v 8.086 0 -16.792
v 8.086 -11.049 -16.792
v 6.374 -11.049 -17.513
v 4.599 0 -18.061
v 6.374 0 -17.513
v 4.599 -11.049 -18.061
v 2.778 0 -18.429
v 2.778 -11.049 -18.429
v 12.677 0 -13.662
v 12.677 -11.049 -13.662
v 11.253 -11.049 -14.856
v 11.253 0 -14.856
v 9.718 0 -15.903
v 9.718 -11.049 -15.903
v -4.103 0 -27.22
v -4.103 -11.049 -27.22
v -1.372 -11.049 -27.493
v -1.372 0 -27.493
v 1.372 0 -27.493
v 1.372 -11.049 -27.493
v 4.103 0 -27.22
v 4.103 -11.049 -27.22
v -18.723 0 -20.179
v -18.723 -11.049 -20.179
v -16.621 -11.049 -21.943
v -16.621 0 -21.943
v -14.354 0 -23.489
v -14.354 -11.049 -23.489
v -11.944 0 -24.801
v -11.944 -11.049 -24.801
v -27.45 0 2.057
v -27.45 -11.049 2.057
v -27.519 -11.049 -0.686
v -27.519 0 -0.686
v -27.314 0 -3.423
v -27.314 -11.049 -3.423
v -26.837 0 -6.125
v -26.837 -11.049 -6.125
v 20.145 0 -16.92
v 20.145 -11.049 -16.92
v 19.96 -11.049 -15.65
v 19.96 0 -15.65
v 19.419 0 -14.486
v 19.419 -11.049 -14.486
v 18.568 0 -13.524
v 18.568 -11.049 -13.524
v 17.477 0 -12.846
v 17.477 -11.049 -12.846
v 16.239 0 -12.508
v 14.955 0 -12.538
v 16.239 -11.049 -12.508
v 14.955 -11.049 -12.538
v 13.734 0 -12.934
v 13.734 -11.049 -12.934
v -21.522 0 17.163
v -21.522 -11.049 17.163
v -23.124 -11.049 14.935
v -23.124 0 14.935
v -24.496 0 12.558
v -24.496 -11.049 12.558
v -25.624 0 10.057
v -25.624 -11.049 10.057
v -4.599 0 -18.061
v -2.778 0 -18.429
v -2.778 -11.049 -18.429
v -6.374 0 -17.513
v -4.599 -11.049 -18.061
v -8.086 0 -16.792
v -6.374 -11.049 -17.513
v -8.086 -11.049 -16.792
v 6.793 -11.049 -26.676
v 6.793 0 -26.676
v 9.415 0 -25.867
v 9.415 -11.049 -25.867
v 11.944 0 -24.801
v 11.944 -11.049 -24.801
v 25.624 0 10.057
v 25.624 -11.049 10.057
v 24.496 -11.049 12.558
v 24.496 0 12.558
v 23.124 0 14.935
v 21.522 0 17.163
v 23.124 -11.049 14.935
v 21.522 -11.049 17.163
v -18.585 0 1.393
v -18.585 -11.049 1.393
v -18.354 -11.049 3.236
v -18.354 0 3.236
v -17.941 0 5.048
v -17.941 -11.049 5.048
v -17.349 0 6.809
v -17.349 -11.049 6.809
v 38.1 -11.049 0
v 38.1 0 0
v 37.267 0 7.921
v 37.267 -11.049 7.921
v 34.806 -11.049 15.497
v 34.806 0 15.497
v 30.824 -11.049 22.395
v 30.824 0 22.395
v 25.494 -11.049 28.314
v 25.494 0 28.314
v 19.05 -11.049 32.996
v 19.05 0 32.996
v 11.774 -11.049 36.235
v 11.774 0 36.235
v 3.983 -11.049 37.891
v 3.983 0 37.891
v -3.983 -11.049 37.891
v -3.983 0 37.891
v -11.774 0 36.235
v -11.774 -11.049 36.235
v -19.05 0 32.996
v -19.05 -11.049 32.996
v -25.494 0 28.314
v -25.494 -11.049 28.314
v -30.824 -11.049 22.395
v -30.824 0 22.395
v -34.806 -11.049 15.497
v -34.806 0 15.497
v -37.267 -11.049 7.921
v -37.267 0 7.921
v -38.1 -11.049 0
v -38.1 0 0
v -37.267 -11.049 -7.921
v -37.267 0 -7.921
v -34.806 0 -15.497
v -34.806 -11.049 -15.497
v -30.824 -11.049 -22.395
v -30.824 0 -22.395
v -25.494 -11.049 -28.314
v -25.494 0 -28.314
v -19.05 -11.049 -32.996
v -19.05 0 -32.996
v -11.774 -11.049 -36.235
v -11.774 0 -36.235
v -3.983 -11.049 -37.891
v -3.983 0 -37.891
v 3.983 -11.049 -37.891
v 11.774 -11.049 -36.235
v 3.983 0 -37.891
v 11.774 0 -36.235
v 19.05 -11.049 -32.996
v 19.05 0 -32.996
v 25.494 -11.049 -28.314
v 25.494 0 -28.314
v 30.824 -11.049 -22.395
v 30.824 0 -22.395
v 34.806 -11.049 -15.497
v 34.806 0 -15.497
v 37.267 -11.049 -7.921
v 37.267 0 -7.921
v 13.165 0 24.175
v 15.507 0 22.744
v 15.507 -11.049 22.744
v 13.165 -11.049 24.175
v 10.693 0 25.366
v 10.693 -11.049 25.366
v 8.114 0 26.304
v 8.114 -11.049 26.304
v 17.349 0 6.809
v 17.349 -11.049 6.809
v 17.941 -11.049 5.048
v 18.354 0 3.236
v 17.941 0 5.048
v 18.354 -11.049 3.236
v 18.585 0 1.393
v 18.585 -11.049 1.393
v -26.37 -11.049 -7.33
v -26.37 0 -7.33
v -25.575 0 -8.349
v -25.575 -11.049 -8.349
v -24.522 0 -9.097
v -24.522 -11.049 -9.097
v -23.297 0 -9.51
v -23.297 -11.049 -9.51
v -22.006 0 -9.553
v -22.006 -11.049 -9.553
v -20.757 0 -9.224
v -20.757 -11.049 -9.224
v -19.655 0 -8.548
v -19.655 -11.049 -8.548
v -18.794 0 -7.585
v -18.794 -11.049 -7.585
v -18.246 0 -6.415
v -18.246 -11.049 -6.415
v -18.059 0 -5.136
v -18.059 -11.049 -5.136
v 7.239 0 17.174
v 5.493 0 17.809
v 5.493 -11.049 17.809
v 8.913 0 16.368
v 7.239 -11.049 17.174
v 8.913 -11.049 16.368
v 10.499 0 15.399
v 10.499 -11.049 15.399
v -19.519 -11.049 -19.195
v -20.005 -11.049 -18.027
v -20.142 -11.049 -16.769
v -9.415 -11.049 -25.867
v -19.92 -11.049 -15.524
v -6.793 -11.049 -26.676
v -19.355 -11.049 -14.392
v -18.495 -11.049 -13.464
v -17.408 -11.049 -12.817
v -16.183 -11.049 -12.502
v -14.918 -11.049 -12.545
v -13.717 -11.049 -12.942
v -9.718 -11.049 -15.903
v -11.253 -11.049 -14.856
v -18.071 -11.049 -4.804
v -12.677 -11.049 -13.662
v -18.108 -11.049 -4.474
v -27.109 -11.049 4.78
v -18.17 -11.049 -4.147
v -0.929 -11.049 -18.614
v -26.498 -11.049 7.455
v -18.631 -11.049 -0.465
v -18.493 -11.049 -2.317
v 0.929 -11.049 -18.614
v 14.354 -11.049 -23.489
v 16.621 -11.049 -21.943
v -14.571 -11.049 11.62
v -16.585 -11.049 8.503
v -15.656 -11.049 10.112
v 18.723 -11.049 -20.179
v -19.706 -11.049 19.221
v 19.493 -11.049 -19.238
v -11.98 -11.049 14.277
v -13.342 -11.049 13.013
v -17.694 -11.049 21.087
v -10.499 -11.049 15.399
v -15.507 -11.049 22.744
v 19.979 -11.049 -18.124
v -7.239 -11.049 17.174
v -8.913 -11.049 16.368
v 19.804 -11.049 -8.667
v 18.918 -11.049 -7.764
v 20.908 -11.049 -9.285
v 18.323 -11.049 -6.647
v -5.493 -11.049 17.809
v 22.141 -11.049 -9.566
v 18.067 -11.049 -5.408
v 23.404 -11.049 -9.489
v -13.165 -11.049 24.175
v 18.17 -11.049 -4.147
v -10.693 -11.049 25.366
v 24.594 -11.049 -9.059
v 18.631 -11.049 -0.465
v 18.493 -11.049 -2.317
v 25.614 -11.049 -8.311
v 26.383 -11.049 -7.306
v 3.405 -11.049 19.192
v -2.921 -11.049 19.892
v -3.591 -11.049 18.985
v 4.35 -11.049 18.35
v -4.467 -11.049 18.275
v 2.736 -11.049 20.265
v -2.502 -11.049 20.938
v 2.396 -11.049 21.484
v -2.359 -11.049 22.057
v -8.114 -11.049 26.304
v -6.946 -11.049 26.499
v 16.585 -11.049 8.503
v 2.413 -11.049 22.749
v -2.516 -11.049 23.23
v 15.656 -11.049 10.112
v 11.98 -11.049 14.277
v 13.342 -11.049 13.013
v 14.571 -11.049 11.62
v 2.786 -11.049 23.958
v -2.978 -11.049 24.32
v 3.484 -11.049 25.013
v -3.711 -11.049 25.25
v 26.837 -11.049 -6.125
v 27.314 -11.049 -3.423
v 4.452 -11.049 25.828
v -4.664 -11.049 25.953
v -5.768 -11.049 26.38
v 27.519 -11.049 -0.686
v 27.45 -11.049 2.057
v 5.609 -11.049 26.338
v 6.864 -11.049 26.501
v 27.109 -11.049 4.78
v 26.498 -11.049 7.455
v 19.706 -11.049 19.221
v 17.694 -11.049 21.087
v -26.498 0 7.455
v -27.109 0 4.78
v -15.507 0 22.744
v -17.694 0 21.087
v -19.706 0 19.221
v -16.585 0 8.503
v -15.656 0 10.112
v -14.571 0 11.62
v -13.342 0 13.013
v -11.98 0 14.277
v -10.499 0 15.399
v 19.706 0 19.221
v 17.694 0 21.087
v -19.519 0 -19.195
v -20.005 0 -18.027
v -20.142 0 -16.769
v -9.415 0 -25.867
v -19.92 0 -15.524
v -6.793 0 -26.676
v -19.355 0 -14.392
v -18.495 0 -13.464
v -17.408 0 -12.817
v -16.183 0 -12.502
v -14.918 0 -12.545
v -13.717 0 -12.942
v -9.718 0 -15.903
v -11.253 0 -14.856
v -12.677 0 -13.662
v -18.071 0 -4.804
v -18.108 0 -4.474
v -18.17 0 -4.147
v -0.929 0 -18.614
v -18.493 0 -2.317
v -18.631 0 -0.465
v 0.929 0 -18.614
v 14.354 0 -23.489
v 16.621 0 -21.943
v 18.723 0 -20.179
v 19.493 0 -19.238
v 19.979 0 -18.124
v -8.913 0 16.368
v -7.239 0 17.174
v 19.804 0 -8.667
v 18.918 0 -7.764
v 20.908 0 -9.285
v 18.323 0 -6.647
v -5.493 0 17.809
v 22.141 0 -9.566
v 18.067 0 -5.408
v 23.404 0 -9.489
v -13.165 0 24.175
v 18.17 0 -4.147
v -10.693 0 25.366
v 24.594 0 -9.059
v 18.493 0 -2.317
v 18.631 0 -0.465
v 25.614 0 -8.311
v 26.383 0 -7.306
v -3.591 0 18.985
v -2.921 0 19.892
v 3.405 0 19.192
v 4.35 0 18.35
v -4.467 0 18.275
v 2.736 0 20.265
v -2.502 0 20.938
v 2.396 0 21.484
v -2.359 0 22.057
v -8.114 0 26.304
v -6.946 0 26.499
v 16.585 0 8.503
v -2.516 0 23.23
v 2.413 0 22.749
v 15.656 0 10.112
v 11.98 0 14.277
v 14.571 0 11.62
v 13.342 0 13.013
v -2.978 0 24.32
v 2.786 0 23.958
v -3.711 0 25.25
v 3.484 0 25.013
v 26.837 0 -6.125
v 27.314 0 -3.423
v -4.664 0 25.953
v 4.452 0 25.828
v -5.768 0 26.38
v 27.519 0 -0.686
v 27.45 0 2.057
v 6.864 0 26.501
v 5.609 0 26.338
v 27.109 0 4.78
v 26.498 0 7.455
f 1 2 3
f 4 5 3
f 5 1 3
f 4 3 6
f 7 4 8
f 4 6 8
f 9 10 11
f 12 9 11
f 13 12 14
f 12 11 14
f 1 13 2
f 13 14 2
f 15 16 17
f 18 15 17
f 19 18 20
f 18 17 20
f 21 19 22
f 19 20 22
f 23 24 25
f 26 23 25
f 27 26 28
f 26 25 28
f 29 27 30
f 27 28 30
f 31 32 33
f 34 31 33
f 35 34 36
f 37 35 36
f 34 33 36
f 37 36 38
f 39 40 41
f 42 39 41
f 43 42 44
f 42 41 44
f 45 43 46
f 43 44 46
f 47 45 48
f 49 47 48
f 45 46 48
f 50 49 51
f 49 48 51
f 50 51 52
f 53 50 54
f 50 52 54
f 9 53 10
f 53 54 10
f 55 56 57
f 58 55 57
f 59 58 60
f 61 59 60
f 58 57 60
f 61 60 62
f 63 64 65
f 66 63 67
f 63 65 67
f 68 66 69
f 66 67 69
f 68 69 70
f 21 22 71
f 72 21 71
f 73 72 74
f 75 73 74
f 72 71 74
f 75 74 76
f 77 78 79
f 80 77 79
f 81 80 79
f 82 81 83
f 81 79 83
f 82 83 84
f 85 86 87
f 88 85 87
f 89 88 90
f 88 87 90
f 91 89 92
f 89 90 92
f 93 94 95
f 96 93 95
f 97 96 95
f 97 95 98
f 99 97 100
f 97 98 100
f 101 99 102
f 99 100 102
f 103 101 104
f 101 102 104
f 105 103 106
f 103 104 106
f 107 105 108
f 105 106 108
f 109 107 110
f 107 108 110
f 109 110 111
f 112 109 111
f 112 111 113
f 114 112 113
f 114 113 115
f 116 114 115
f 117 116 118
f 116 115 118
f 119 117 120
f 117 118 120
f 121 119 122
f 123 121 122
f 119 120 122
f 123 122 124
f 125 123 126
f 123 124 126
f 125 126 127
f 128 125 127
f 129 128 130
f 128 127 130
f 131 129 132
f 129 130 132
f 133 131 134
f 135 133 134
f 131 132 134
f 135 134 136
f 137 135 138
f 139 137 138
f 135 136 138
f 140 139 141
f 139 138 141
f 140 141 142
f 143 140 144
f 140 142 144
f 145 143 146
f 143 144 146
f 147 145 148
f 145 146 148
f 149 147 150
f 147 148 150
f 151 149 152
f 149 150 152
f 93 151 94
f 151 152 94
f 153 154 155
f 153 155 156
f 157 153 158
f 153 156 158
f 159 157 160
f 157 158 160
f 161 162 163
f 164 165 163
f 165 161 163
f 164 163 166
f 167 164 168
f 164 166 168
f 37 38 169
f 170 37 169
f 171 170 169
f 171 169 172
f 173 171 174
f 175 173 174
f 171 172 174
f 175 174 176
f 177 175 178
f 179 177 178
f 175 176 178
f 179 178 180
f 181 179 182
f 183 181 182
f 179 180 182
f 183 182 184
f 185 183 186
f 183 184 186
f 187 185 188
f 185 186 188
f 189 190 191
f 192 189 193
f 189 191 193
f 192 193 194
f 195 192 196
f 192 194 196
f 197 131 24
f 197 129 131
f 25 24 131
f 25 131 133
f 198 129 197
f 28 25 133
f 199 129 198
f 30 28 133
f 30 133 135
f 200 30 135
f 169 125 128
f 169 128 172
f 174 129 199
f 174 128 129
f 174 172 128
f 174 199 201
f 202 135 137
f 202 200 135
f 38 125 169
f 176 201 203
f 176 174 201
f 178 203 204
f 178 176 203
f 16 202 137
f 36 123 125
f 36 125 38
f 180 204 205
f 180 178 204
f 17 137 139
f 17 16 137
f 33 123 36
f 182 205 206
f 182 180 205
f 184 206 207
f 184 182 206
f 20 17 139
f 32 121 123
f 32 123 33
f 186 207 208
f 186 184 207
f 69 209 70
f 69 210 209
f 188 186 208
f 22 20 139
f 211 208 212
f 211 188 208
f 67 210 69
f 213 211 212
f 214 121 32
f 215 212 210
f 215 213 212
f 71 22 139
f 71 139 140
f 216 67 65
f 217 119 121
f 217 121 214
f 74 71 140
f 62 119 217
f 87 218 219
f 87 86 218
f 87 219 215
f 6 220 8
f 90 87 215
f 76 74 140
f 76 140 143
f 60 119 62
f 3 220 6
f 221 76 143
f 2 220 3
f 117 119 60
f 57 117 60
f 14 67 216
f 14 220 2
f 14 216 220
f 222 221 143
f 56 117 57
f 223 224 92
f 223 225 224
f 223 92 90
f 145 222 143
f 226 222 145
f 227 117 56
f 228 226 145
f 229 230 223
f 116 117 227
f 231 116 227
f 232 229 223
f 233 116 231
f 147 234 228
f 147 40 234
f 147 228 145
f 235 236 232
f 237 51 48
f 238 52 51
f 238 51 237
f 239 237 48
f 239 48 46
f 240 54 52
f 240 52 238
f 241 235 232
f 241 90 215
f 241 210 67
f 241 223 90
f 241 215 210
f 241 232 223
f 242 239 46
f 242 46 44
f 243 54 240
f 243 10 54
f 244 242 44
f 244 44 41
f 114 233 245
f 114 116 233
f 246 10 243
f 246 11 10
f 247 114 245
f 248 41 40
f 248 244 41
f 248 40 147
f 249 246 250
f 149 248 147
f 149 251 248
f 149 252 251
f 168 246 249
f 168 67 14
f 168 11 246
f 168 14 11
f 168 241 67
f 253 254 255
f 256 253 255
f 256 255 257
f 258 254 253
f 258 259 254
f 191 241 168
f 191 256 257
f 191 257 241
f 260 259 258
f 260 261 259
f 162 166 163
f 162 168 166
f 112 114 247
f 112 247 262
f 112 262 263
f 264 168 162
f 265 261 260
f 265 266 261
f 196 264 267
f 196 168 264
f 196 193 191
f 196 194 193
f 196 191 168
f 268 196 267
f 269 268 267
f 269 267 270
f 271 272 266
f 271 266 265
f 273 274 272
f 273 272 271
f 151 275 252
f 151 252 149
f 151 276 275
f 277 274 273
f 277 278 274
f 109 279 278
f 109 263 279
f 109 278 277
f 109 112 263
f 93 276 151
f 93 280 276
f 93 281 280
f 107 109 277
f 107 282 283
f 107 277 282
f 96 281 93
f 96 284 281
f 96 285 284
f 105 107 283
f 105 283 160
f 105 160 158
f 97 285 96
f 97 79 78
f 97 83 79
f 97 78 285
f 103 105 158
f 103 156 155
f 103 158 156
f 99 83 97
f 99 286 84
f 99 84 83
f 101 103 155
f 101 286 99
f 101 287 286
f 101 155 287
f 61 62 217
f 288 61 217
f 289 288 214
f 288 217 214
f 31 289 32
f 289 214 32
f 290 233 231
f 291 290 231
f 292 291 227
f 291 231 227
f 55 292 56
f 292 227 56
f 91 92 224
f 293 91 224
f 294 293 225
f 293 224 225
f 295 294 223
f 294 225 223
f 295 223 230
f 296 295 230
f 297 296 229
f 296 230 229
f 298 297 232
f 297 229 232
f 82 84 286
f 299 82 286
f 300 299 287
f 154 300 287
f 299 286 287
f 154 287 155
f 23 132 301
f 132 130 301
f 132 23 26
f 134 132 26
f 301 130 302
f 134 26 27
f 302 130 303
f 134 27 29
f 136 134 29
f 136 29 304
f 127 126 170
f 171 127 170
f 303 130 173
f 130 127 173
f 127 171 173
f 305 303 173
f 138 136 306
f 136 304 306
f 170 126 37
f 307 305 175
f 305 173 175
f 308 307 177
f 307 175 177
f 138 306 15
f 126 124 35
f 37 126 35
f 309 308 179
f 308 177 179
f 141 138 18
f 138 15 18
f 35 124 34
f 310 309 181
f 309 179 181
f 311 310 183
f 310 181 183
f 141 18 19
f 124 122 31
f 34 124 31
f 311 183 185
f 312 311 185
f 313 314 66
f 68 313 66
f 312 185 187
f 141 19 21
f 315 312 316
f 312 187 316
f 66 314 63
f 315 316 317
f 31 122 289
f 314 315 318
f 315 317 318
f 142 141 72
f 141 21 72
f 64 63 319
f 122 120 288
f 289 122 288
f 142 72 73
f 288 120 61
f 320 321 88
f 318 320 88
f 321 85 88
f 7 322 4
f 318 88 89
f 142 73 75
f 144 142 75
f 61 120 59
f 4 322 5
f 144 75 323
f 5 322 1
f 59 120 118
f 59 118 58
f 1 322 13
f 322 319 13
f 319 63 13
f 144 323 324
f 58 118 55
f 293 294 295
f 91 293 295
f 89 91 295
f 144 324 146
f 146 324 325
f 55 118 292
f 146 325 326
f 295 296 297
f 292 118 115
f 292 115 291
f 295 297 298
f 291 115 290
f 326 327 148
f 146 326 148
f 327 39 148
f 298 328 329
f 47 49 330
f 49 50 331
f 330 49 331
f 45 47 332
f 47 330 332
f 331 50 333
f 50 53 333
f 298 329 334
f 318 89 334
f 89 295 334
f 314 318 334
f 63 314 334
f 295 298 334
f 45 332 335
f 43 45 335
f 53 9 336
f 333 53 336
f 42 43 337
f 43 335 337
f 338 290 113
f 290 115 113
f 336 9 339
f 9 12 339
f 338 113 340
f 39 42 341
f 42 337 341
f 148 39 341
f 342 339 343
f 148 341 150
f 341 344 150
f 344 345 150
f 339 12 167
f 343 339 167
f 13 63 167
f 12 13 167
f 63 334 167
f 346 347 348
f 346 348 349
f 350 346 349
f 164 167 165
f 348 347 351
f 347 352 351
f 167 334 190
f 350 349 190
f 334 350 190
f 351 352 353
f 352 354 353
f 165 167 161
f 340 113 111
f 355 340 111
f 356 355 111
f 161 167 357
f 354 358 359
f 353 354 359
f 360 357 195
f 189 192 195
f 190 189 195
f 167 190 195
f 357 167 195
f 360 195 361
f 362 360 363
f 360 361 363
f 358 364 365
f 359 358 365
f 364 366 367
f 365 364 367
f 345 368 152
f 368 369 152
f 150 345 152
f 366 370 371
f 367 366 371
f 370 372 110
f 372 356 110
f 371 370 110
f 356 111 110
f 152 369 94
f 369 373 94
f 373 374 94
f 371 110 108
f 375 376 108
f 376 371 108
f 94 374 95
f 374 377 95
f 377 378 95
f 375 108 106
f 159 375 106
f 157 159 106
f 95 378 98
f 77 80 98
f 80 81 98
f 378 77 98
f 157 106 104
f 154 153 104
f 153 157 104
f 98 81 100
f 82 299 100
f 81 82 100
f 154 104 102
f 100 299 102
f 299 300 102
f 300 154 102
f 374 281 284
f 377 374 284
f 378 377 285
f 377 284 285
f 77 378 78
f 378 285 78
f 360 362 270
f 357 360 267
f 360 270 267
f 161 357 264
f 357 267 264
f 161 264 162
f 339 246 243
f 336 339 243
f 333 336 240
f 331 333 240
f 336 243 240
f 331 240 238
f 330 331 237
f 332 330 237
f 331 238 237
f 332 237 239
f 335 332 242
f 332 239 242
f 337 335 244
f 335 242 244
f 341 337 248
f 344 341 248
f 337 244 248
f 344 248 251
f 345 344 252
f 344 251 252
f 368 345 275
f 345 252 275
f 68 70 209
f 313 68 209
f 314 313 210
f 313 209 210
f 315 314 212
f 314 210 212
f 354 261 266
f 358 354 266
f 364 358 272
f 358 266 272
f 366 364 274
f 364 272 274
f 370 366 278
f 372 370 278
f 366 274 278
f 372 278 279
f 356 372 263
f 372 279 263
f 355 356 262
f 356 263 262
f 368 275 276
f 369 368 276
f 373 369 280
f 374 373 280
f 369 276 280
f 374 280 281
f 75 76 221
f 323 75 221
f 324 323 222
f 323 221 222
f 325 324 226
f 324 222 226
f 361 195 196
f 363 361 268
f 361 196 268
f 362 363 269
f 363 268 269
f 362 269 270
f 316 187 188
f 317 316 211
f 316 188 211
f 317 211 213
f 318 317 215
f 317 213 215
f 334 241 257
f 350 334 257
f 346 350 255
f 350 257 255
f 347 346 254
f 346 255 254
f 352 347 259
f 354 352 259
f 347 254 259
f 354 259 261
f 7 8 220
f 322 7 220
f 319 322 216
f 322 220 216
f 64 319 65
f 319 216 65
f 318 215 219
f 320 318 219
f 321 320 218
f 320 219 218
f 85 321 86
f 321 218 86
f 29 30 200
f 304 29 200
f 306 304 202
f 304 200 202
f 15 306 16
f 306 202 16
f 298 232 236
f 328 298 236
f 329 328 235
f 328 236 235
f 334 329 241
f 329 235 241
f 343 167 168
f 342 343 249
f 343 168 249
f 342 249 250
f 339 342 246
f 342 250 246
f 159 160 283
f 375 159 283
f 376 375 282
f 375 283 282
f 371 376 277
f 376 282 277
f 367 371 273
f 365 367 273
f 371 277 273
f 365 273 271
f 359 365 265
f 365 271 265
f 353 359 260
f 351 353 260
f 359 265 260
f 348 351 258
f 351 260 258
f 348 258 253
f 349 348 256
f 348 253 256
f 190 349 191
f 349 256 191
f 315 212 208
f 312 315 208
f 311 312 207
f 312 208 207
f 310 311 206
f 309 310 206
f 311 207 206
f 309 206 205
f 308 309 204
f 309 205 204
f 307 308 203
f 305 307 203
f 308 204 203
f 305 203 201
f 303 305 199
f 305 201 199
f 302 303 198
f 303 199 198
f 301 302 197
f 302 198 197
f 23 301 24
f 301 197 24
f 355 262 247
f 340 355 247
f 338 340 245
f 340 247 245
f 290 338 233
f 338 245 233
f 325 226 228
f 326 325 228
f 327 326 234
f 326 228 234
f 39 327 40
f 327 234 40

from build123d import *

# Parameters (mm, degrees)
F0_R     = 38.1
F1_DEPTH = 11.049
F3_DEPTH = 11.05


with BuildPart() as f1:
    # F0 (on Front) → F1 (new body)
    with BuildSketch(Plane.XZ):
        Circle(F0_R)
    extrude(amount=F1_DEPTH)

    # F2 (on face) → F3 (cut, through all)
    with BuildSketch(Plane.XZ.offset(11.049)):
        with BuildLine():
            ThreePointArc((-5.4934258743, 17.8092492746), (-3.2271754935, 19.4172396715), (-2.3586126245, 22.0567703964))
            ThreePointArc((-2.3586126245, 22.0567703964), (-4.1640818997, 25.6332075274), (-8.1137993748, 26.3042915181))
            ThreePointArc((-8.1137993748, 26.3042915181), (-10.0430162679, 25.1004998579), (-11.1244292478, 23.1001153577))
            ThreePointArc((-11.1244292478, 23.1001153577), (-9.253900361, 21.4598737334), (-8.5576944102, 19.0714499485))
            ThreePointArc((-8.5576944102, 19.0714499485), (-8.5888494373, 18.5460952541), (-8.681877787, 18.0281049871))
            ThreePointArc((-8.681877787, 18.0281049871), (-7.108001728, 17.6222047723), (-5.4934258743, 17.8092492746))
        make_face()
        with BuildLine():
            ThreePointArc((-11.1244292478, 23.1001153577), (-10.0430162679, 25.1004998579), (-8.1137993748, 26.3042915181))
            ThreePointArc((-8.1137993748, 26.3042915181), (-11.9436262917, 24.8011952044), (-15.5066523142, 22.7440811326))
            ThreePointArc((-15.5066523142, 22.7440811326), (-13.36264294, 23.5018519681), (-11.1244292478, 23.1001153577))
        make_face()
        with BuildLine():
            ThreePointArc((-10.498736832, 15.3988185422), (-8.0863997604, 16.7915820124), (-5.4934258743, 17.8092492746))
            ThreePointArc((-5.4934258743, 17.8092492746), (-7.108001728, 17.6222047723), (-8.681877787, 18.0281049871))
            ThreePointArc((-8.681877787, 18.0281049871), (-9.34582792, 16.5445244505), (-10.498736832, 15.3988185422))
        make_face()
        with BuildLine():
            ThreePointArc((-8.5576944102, 19.0714499485), (-9.253900361, 21.4598737334), (-11.1244292478, 23.1001153577))
            ThreePointArc((-11.1244292478, 23.1001153577), (-10.8084192424, 20.128157176), (-8.681877787, 18.0281049871))
            ThreePointArc((-8.681877787, 18.0281049871), (-8.5888494373, 18.5460952541), (-8.5576944102, 19.0714499485))
        make_face()
        with BuildLine():
            ThreePointArc((-8.681877787, 18.0281049871), (-10.8084192424, 20.128157176), (-11.1244292478, 23.1001153577))
            ThreePointArc((-11.1244292478, 23.1001153577), (-13.36264294, 23.5018519681), (-15.5066523142, 22.7440811326))
            ThreePointArc((-15.5066523142, 22.7440811326), (-16.9953355125, 21.0251239305), (-17.4390806002, 18.7948589632))
            ThreePointArc((-17.4390806002, 18.7948589632), (-14.7880141659, 17.4149152983), (-13.6100435462, 14.6681384642))
            ThreePointArc((-13.6100435462, 14.6681384642), (-11.986449243, 14.7441793583), (-10.498736832, 15.3988185422))
            ThreePointArc((-10.498736832, 15.3988185422), (-9.34582792, 16.5445244505), (-8.681877787, 18.0281049871))
        make_face()
        with BuildLine():
            ThreePointArc((-17.4390806002, 18.7948589632), (-16.9953355125, 21.0251239305), (-15.5066523142, 22.7440811326))
            ThreePointArc((-15.5066523142, 22.7440811326), (-18.7232851045, 20.178902038), (-21.5216706751, 17.1629596491))
            ThreePointArc((-21.5216706751, 17.1629596491), (-19.696270544, 18.5190225314), (-17.4390806002, 18.7948589632))
        make_face()
        with BuildLine():
            ThreePointArc((-14.571188844, 11.6201352503), (-12.6765494203, 13.6620709396), (-10.498736832, 15.3988185422))
            ThreePointArc((-10.498736832, 15.3988185422), (-11.986449243, 14.7441793583), (-13.6100435462, 14.6681384642))
            ThreePointArc((-13.6100435462, 14.6681384642), (-13.6035837106, 14.5299100198), (-13.6014297362, 14.391547479))
            ThreePointArc((-13.6014297362, 14.391547479), (-13.8508683455, 12.9234570127), (-14.571188844, 11.6201352503))
        make_face()
        with BuildLine():
            ThreePointArc((-13.6100435462, 14.6681384642), (-14.7880141659, 17.4149152983), (-17.4390806002, 18.7948589632))
            ThreePointArc((-17.4390806002, 18.7948589632), (-16.2611099805, 16.0480821291), (-13.6100435462, 14.6681384642))
        make_face()
        with BuildLine():
            ThreePointArc((-13.6100435462, 14.6681384642), (-16.2611099805, 16.0480821291), (-17.4390806002, 18.7948589632))
            ThreePointArc((-17.4390806002, 18.7948589632), (-19.696270544, 18.5190225314), (-21.5216706751, 17.1629596491))
            ThreePointArc((-21.5216706751, 17.1629596491), (-22.437544489, 15.0815737307), (-22.2041931112, 12.8195968699))
            ThreePointArc((-22.2041931112, 12.8195968699), (-19.2641605846, 12.2823757795), (-17.3288972096, 10.0048434687))
            ThreePointArc((-17.3288972096, 10.0048434687), (-15.7998480839, 10.5560689065), (-14.571188844, 11.6201352503))
            ThreePointArc((-14.571188844, 11.6201352503), (-13.8508683455, 12.9234570127), (-13.6014297362, 14.391547479))
            ThreePointArc((-13.6014297362, 14.391547479), (-13.6035837106, 14.5299100198), (-13.6100435462, 14.6681384642))
        make_face()
        with BuildLine():
            ThreePointArc((-22.2041931112, 12.8195968699), (-22.437544489, 15.0815737307), (-21.5216706751, 17.1629596491))
            ThreePointArc((-21.5216706751, 17.1629596491), (-23.8392977721, 13.7636250419), (-25.6243943624, 10.0568338021))
            ThreePointArc((-25.6243943624, 10.0568338021), (-24.2797981866, 11.8906966911), (-22.2041931112, 12.8195968699))
        make_face()
        with BuildLine():
            ThreePointArc((-17.3489268741, 6.8089517461), (-16.1403320456, 9.3186248461), (-14.571188844, 11.6201352503))
            ThreePointArc((-14.571188844, 11.6201352503), (-15.7998480839, 10.5560689065), (-17.3288972096, 10.0048434687))
            ThreePointArc((-17.3288972096, 10.0048434687), (-17.114059345, 9.2318818452), (-17.0416605846, 8.4328928597))
            ThreePointArc((-17.0416605846, 8.4328928597), (-17.1191526371, 7.6065156285), (-17.3489268741, 6.8089517461))
        make_face()
        with BuildLine():
            ThreePointArc((-17.3288972096, 10.0048434687), (-19.2641605846, 12.2823757795), (-22.2041931112, 12.8195968699))
            ThreePointArc((-22.2041931112, 12.8195968699), (-20.2689297362, 10.5420645591), (-17.3288972096, 10.0048434687))
        make_face()
        with BuildLine():
            ThreePointArc((-17.3288972096, 10.0048434687), (-20.2689297362, 10.5420645591), (-22.2041931112, 12.8195968699))
            ThreePointArc((-22.2041931112, 12.8195968699), (-24.2797981866, 11.8906966911), (-25.6243943624, 10.0568338021))
            ThreePointArc((-25.6243943624, 10.0568338021), (-25.8860792444, 7.7979594331), (-24.9963656228, 5.7052573369))
            ThreePointArc((-24.9963656228, 5.7052573369), (-22.028601796, 6.0584932723), (-19.5080023094, 4.4525742255))
            ThreePointArc((-19.5080023094, 4.4525742255), (-18.209361165, 5.4300053303), (-17.3489268741, 6.8089517461))
            ThreePointArc((-17.3489268741, 6.8089517461), (-17.1191526371, 7.6065156285), (-17.0416605846, 8.4328928597))
            ThreePointArc((-17.0416605846, 8.4328928597), (-17.114059345, 9.2318818452), (-17.3288972096, 10.0048434687))
        make_face()
        with BuildLine():
            ThreePointArc((-24.9963656228, 5.7052573369), (-25.8860792444, 7.7979594331), (-25.6243943624, 10.0568338021))
            ThreePointArc((-25.6243943624, 10.0568338021), (-26.8370843559, 6.1253894436), (-27.4502782232, 2.0571140049))
            ThreePointArc((-27.4502782232, 2.0571140049), (-26.7059592707, 4.205830226), (-24.9963656228, 5.7052573369))
        make_face()
        with BuildLine():
            ThreePointArc((-18.5851364875, 1.3927631904), (-18.1699752899, 4.1471780197), (-17.3489268741, 6.8089517461))
            ThreePointArc((-17.3489268741, 6.8089517461), (-18.209361165, 5.4300053303), (-19.5080023094, 4.4525742255))
            ThreePointArc((-19.5080023094, 4.4525742255), (-18.81302758, 3.1667060392), (-18.5727073475, 1.7249387027))
            ThreePointArc((-18.5727073475, 1.7249387027), (-18.5758157193, 1.5587347207), (-18.5851364875, 1.3927631904))
        make_face()
        with BuildLine():
            ThreePointArc((-19.5080023094, 4.4525742255), (-22.028601796, 6.0584932723), (-24.9963656228, 5.7052573369))
            ThreePointArc((-24.9963656228, 5.7052573369), (-22.4757661361, 4.09933829), (-19.5080023094, 4.4525742255))
        make_face()
        with BuildLine():
            ThreePointArc((-19.5080023094, 4.4525742255), (-22.4757661361, 4.09933829), (-24.9963656228, 5.7052573369))
            ThreePointArc((-24.9963656228, 5.7052573369), (-26.7059592707, 4.205830226), (-27.4502782232, 2.0571140049))
            ThreePointArc((-27.4502782232, 2.0571140049), (-27.0345222544, -0.1785378544), (-25.567501354, -1.9160193477))
            ThreePointArc((-25.567501354, -1.9160193477), (-22.835705067, -0.7037129493), (-19.9537357944, -1.4953257775))
            ThreePointArc((-19.9537357944, -1.4953257775), (-19.0008925012, -0.1785379824), (-18.5851364875, 1.3927631904))
            ThreePointArc((-18.5851364875, 1.3927631904), (-18.5758157193, 1.5587347207), (-18.5727073475, 1.7249387027))
            ThreePointArc((-18.5727073475, 1.7249387027), (-18.81302758, 3.1667060392), (-19.5080023094, 4.4525742255))
        make_face()
        with BuildLine():
            ThreePointArc((-25.567501354, -1.9160193477), (-27.0345222544, -0.1785378544), (-27.4502782232, 2.0571140049))
            ThreePointArc((-27.4502782232, 2.0571140049), (-27.4502782273, -2.0571139506), (-26.8370843706, -6.1253893792))
            ThreePointArc((-26.8370843706, -6.1253893792), (-26.7591786586, -3.8527427103), (-25.567501354, -1.9160193477))
        make_face()
        with BuildLine():
            ThreePointArc((-18.1699752313, -4.1471782764), (-18.5851364598, -1.3927635598), (-18.5851364875, 1.3927631904))
            ThreePointArc((-18.5851364875, 1.3927631904), (-19.0008925012, -0.1785379824), (-19.9537357944, -1.4953257775))
            ThreePointArc((-19.9537357944, -1.4953257775), (-18.8152778676, -2.6553923195), (-18.1699752313, -4.1471782764))
        make_face()
        with BuildLine():
            ThreePointArc((-19.9537357944, -1.4953257775), (-22.835705067, -0.7037129493), (-25.567501354, -1.9160193477))
            ThreePointArc((-25.567501354, -1.9160193477), (-22.6855320815, -2.7076321758), (-19.9537357944, -1.4953257775))
        make_face()
        with BuildLine():
            ThreePointArc((-19.9537357944, -1.4953257775), (-22.6855320815, -2.7076321758), (-25.567501354, -1.9160193477))
            ThreePointArc((-25.567501354, -1.9160193477), (-26.7591786586, -3.8527427103), (-26.8370843706, -6.1253893792))
            ThreePointArc((-26.8370843706, -6.1253893792), (-22.0058477047, -9.5533346008), (-18.058529801, -5.1362838278))
            ThreePointArc((-18.058529801, -5.1362838278), (-18.086479028, -4.6386017315), (-18.1699752313, -4.1471782764))
            ThreePointArc((-18.1699752313, -4.1471782764), (-18.8152778676, -2.6553923195), (-19.9537357944, -1.4953257775))
        make_face()
        with BuildLine():
            ThreePointArc((-11.2718580074, -16.5327792097), (-11.7072761395, -14.9668124528), (-12.676549357, -13.6620709983))
            ThreePointArc((-12.676549357, -13.6620709983), (-18.9583327467, -13.8971187492), (-18.7232849958, -20.1789021388))
            ThreePointArc((-18.7232849958, -20.1789021388), (-16.7161623907, -21.2477571476), (-14.4430721062, -21.18409601))
            ThreePointArc((-14.4430721062, -21.18409601), (-13.6876442891, -18.292430993), (-11.2718580074, -16.5327792097))
        make_face()
        with BuildLine():
            ThreePointArc((-8.0863997947, -16.7915819959), (-10.4987367878, -15.3988185723), (-12.676549357, -13.6620709983))
            ThreePointArc((-12.676549357, -13.6620709983), (-11.7072761395, -14.9668124528), (-11.2718580074, -16.5327792097))
            ThreePointArc((-11.2718580074, -16.5327792097), (-9.6550645989, -16.3659866159), (-8.0863997947, -16.7915819959))
        make_face()
        with BuildLine():
            ThreePointArc((-14.4430721062, -21.18409601), (-16.7161623907, -21.2477571476), (-18.7232849958, -20.1789021388))
            ThreePointArc((-18.7232849958, -20.1789021388), (-15.5066520681, -22.7440813004), (-11.9436261572, -24.8011952692))
            ThreePointArc((-11.9436261572, -24.8011952692), (-13.6718794549, -23.3233141096), (-14.4430721062, -21.18409601))
        make_face()
        with BuildLine():
            ThreePointArc((-8.0863997947, -16.7915819959), (-9.6550645989, -16.3659866159), (-11.2718580074, -16.5327792097))
            ThreePointArc((-11.2718580074, -16.5327792097), (-11.2591544038, -16.7264479204), (-11.2549171764, -16.9204865685))
            ThreePointArc((-11.2549171764, -16.9204865685), (-12.1400926486, -19.5823795663), (-14.4430721062, -21.18409601))
            ThreePointArc((-14.4430721062, -21.18409601), (-13.6718794549, -23.3233141096), (-11.9436261572, -24.8011952692))
            ThreePointArc((-11.9436261572, -24.8011952692), (-9.7106238335, -25.2309542751), (-7.5572850225, -24.5001163))
            ThreePointArc((-7.5572850225, -24.5001163), (-7.6877519702, -21.5142535884), (-5.8979587632, -19.1207126897))
            ThreePointArc((-5.8979587632, -19.1207126897), (-6.7756093234, -17.7526591581), (-8.0863997947, -16.7915819959))
        make_face()
        with BuildLine():
            ThreePointArc((-11.2549171764, -16.9204865685), (-11.2591544038, -16.7264479204), (-11.2718580074, -16.5327792097))
            ThreePointArc((-11.2718580074, -16.5327792097), (-13.6876442891, -18.292430993), (-14.4430721062, -21.18409601))
            ThreePointArc((-14.4430721062, -21.18409601), (-12.1400926486, -19.5823795663), (-11.2549171764, -16.9204865685))
        make_face()
        with BuildLine():
            ThreePointArc((-2.777738202, -18.4290872819), (-5.4934260251, -17.8092492281), (-8.0863997947, -16.7915819959))
            ThreePointArc((-8.0863997947, -16.7915819959), (-6.7756093234, -17.7526591581), (-5.8979587632, -19.1207126897))
            ThreePointArc((-5.8979587632, -19.1207126897), (-4.4021579991, -18.4847720153), (-2.777738202, -18.4290872819))
        make_face()
        with BuildLine():
            ThreePointArc((-7.5572850225, -24.5001163), (-9.7106238335, -25.2309542751), (-11.9436261572, -24.8011952692))
            ThreePointArc((-11.9436261572, -24.8011952692), (-8.1137993206, -26.3042915348), (-4.10272361, -27.219793378))
            ThreePointArc((-4.10272361, -27.219793378), (-6.1898086487, -26.3169819519), (-7.5572850225, -24.5001163))
        make_face()
        with BuildLine():
            ThreePointArc((-2.777738202, -18.4290872819), (-4.4021579991, -18.4847720153), (-5.8979587632, -19.1207126897))
            ThreePointArc((-5.8979587632, -19.1207126897), (-5.6527697755, -19.9426559072), (-5.5700129372, -20.7963886511))
            ThreePointArc((-5.5700129372, -20.7963886511), (-6.0982141435, -22.8979861886), (-7.5572850225, -24.5001163))
            ThreePointArc((-7.5572850225, -24.5001163), (-6.1898086487, -26.3169819519), (-4.10272361, -27.219793378))
            ThreePointArc((-4.10272361, -27.219793378), (-1.8422536822, -26.9722703708), (0, -25.6391937398))
            ThreePointArc((0, -25.6391937398), (-1.0047691516, -22.8244403386), (0, -20.0096869375))
            ThreePointArc((0, -20.0096869375), (-1.2418999278, -18.9611041944), (-2.777738202, -18.4290872819))
        make_face()
        with BuildLine():
            ThreePointArc((-5.5700129372, -20.7963886511), (-5.6527697755, -19.9426559072), (-5.8979587632, -19.1207126897))
            ThreePointArc((-5.8979587632, -19.1207126897), (-7.6877519702, -21.5142535884), (-7.5572850225, -24.5001163))
            ThreePointArc((-7.5572850225, -24.5001163), (-6.0982141435, -22.8979861886), (-5.5700129372, -20.7963886511))
        make_face()
        with BuildLine():
            ThreePointArc((2.7777382002, -18.4290872822), (-9e-10, -18.63725), (-2.777738202, -18.4290872819))
            ThreePointArc((-2.777738202, -18.4290872819), (-1.2418999278, -18.9611041944), (0, -20.0096869375))
            ThreePointArc((0, -20.0096869375), (1.241899927, -18.9611041949), (2.7777382002, -18.4290872822))
        make_face()
        with BuildLine():
            ThreePointArc((0, -25.6391937398), (-1.8422536822, -26.9722703708), (-4.10272361, -27.219793378))
            ThreePointArc((-4.10272361, -27.219793378), (3e-10, -27.52725), (4.1027236105, -27.219793378))
            ThreePointArc((4.1027236105, -27.219793378), (1.8422536824, -26.9722703709), (0, -25.6391937398))
        make_face()
        with BuildLine():
            ThreePointArc((2.7777382002, -18.4290872822), (1.241899927, -18.9611041949), (0, -20.0096869375))
            ThreePointArc((0, -20.0096869375), (0.7460473985, -21.3300844776), (1.0047691516, -22.8244403386))
            ThreePointArc((1.0047691516, -22.8244403386), (0.7460473985, -24.3187961996), (0, -25.6391937398))
            ThreePointArc((0, -25.6391937398), (1.8422536824, -26.9722703709), (4.1027236105, -27.219793378))
            ThreePointArc((4.1027236105, -27.219793378), (6.1898086489, -26.3169819518), (7.5572850225, -24.5001163))
            ThreePointArc((7.5572850225, -24.5001163), (5.7674918155, -22.1065754014), (5.8979587632, -19.1207126897))
            ThreePointArc((5.8979587632, -19.1207126897), (4.4021579983, -18.4847720151), (2.7777382002, -18.4290872822))
        make_face()
        with BuildLine():
            ThreePointArc((1.0047691516, -22.8244403386), (0.7460473985, -21.3300844776), (0, -20.0096869375))
            ThreePointArc((0, -20.0096869375), (-1.0047691516, -22.8244403386), (0, -25.6391937398))
            ThreePointArc((0, -25.6391937398), (0.7460473985, -24.3187961996), (1.0047691516, -22.8244403386))
        make_face()
        with BuildLine():
            ThreePointArc((8.0863994561, -16.7915821589), (5.4934258447, -17.8092492838), (2.7777382002, -18.4290872822))
            ThreePointArc((2.7777382002, -18.4290872822), (4.4021579983, -18.4847720151), (5.8979587632, -19.1207126897))
            ThreePointArc((5.8979587632, -19.1207126897), (6.7756091948, -17.752659295), (8.0863994561, -16.7915821589))
        make_face()
        with BuildLine():
            ThreePointArc((7.5572850225, -24.5001163), (6.1898086489, -26.3169819518), (4.1027236105, -27.219793378))
            ThreePointArc((4.1027236105, -27.219793378), (8.1137992679, -26.3042915511), (11.9436260573, -24.8011953173))
            ThreePointArc((11.9436260573, -24.8011953173), (9.7106237782, -25.2309542713), (7.5572850225, -24.5001163))
        make_face()
        with BuildLine():
            ThreePointArc((8.0863994561, -16.7915821589), (6.7756091948, -17.752659295), (5.8979587632, -19.1207126897))
            ThreePointArc((5.8979587632, -19.1207126897), (7.3570296422, -20.7228428012), (7.8852308484, -22.8244403386))
            ThreePointArc((7.8852308484, -22.8244403386), (7.8024740102, -23.6781730826), (7.5572850225, -24.5001163))
            ThreePointArc((7.5572850225, -24.5001163), (9.7106237782, -25.2309542713), (11.9436260573, -24.8011953173))
            ThreePointArc((11.9436260573, -24.8011953173), (13.6718794233, -23.3233141552), (14.4430721062, -21.18409601))
            ThreePointArc((14.4430721062, -21.18409601), (12.0272858246, -19.4244442266), (11.2718580074, -16.5327792097))
            ThreePointArc((11.2718580074, -16.5327792097), (9.6550644116, -16.3659866311), (8.0863994561, -16.7915821589))
        make_face()
        with BuildLine():
            ThreePointArc((7.8852308484, -22.8244403386), (7.3570296422, -20.7228428012), (5.8979587632, -19.1207126897))
            ThreePointArc((5.8979587632, -19.1207126897), (5.7674918155, -22.1065754014), (7.5572850225, -24.5001163))
            ThreePointArc((7.5572850225, -24.5001163), (7.8024740102, -23.6781730826), (7.8852308484, -22.8244403386))
        make_face()
        with BuildLine():
            ThreePointArc((12.676549357, -13.6620709983), (10.4987366326, -15.3988186781), (8.0863994561, -16.7915821589))
            ThreePointArc((8.0863994561, -16.7915821589), (9.6550644116, -16.3659866311), (11.2718580074, -16.5327792097))
            ThreePointArc((11.2718580074, -16.5327792097), (11.7072761395, -14.9668124528), (12.676549357, -13.6620709983))
        make_face()
        with BuildLine():
            ThreePointArc((14.4430721062, -21.18409601), (13.6718794233, -23.3233141552), (11.9436260573, -24.8011953173))
            ThreePointArc((11.9436260573, -24.8011953173), (15.5066520223, -22.7440813317), (18.7232849958, -20.1789021388))
            ThreePointArc((18.7232849958, -20.1789021388), (16.7161623907, -21.2477571476), (14.4430721062, -21.18409601))
        make_face()
        with BuildLine():
            ThreePointArc((12.676549357, -13.6620709983), (11.7072761395, -14.9668124528), (11.2718580074, -16.5327792097))
            ThreePointArc((11.2718580074, -16.5327792097), (13.574837465, -18.1344956534), (14.4600129372, -20.7963886511))
            ThreePointArc((14.4600129372, -20.7963886511), (14.4557757099, -20.9904272993), (14.4430721062, -21.18409601))
            ThreePointArc((14.4430721062, -21.18409601), (16.7161623907, -21.2477571476), (18.7232849958, -20.1789021388))
            ThreePointArc((18.7232849958, -20.1789021388), (19.7740364038, -18.6980066166), (20.1449171764, -16.9204865685))
            ThreePointArc((20.1449171764, -16.9204865685), (17.4774372245, -12.8463673412), (12.676549357, -13.6620709983))
        make_face()
        with BuildLine():
            ThreePointArc((14.4600129372, -20.7963886511), (13.574837465, -18.1344956534), (11.2718580074, -16.5327792097))
            ThreePointArc((11.2718580074, -16.5327792097), (12.0272858246, -19.4244442266), (14.4430721062, -21.18409601))
            ThreePointArc((14.4430721062, -21.18409601), (14.4557757099, -20.9904272993), (14.4600129372, -20.7963886511))
        make_face()
        with BuildLine():
            ThreePointArc((19.9537357944, -1.4953257775), (18.8152778676, -2.6553923195), (18.1699752313, -4.1471782764))
            ThreePointArc((18.1699752313, -4.1471782764), (21.5144242495, -9.4698383975), (26.8370843706, -6.1253893792))
            ThreePointArc((26.8370843706, -6.1253893792), (26.9205805739, -5.6339659241), (26.948529801, -5.1362838278))
            ThreePointArc((26.948529801, -5.1362838278), (26.5887090231, -3.3843318526), (25.567501354, -1.9160193477))
            ThreePointArc((25.567501354, -1.9160193477), (22.6855320815, -2.7076321758), (19.9537357944, -1.4953257775))
        make_face()
        with BuildLine():
            ThreePointArc((18.5851364872, 1.3927631935), (18.5851364599, -1.3927635583), (18.1699752313, -4.1471782764))
            ThreePointArc((18.1699752313, -4.1471782764), (18.8152778676, -2.6553923195), (19.9537357944, -1.4953257775))
            ThreePointArc((19.9537357944, -1.4953257775), (19.0008925005, -0.178537981), (18.5851364872, 1.3927631935))
        make_face()
        with BuildLine():
            ThreePointArc((26.948529801, -5.1362838278), (26.9205805739, -5.6339659241), (26.8370843706, -6.1253893792))
            ThreePointArc((26.8370843706, -6.1253893792), (27.4502782184, -2.0571140698), (27.4502782411, 2.0571137665))
            ThreePointArc((27.4502782411, 2.0571137665), (27.4595989841, 1.8911424599), (27.4627073475, 1.7249387027))
            ThreePointArc((27.4627073475, 1.7249387027), (26.9605400449, -0.327400285), (25.567501354, -1.9160193477))
            ThreePointArc((25.567501354, -1.9160193477), (26.5887090231, -3.3843318526), (26.948529801, -5.1362838278))
        make_face()
        with BuildLine():
            ThreePointArc((18.5851364872, 1.3927631935), (19.0008925005, -0.178537981), (19.9537357944, -1.4953257775))
            ThreePointArc((19.9537357944, -1.4953257775), (22.835705067, -0.7037129493), (25.567501354, -1.9160193477))
            ThreePointArc((25.567501354, -1.9160193477), (26.9605400449, -0.327400285), (27.4627073475, 1.7249387027))
            ThreePointArc((27.4627073475, 1.7249387027), (27.4595989841, 1.8911424599), (27.4502782411, 2.0571137665))
            ThreePointArc((27.4502782411, 2.0571137665), (26.7059593375, 4.2058301268), (24.9963656228, 5.7052573369))
            ThreePointArc((24.9963656228, 5.7052573369), (22.4757661361, 4.09933829), (19.5080023094, 4.4525742255))
            ThreePointArc((19.5080023094, 4.4525742255), (18.7620584546, 3.0084797035), (18.5851364872, 1.3927631935))
        make_face()
        with BuildLine():
            ThreePointArc((25.567501354, -1.9160193477), (22.835705067, -0.7037129493), (19.9537357944, -1.4953257775))
            ThreePointArc((19.9537357944, -1.4953257775), (22.6855320815, -2.7076321758), (25.567501354, -1.9160193477))
        make_face()
        with BuildLine():
            ThreePointArc((17.3489268739, 6.8089517465), (18.1699752895, 4.1471780214), (18.5851364872, 1.3927631935))
            ThreePointArc((18.5851364872, 1.3927631935), (18.7620584546, 3.0084797035), (19.5080023094, 4.4525742255))
            ThreePointArc((19.5080023094, 4.4525742255), (18.2093611648, 5.4300053305), (17.3489268739, 6.8089517465))
        make_face()
        with BuildLine():
            ThreePointArc((24.9963656228, 5.7052573369), (26.7059593375, 4.2058301268), (27.4502782411, 2.0571137665))
            ThreePointArc((27.4502782411, 2.0571137665), (26.8370843933, 6.12538928), (25.6243943976, 10.0568337123))
            ThreePointArc((25.6243943976, 10.0568337123), (25.8541685582, 9.2592699531), (25.9316605846, 8.4328928597))
            ThreePointArc((25.9316605846, 8.4328928597), (25.6913403521, 6.9911255231), (24.9963656228, 5.7052573369))
        make_face()
        with BuildLine():
            ThreePointArc((17.3489268739, 6.8089517465), (18.2093611648, 5.4300053305), (19.5080023094, 4.4525742255))
            ThreePointArc((19.5080023094, 4.4525742255), (22.028601796, 6.0584932723), (24.9963656228, 5.7052573369))
            ThreePointArc((24.9963656228, 5.7052573369), (25.6913403521, 6.9911255231), (25.9316605846, 8.4328928597))
            ThreePointArc((25.9316605846, 8.4328928597), (25.8541685582, 9.2592699531), (25.6243943976, 10.0568337123))
            ThreePointArc((25.6243943976, 10.0568337123), (24.2797982242, 11.8906966607), (22.2041931112, 12.8195968699))
            ThreePointArc((22.2041931112, 12.8195968699), (20.2689297362, 10.5420645591), (17.3288972096, 10.0048434687))
            ThreePointArc((17.3288972096, 10.0048434687), (17.0417478802, 8.4050351858), (17.3489268739, 6.8089517465))
        make_face()
        with BuildLine():
            ThreePointArc((24.9963656228, 5.7052573369), (22.028601796, 6.0584932723), (19.5080023094, 4.4525742255))
            ThreePointArc((19.5080023094, 4.4525742255), (22.4757661361, 4.09933829), (24.9963656228, 5.7052573369))
        make_face()
        with BuildLine():
            ThreePointArc((14.5711889608, 11.6201351039), (16.1403320923, 9.3186247651), (17.3489268739, 6.8089517465))
            ThreePointArc((17.3489268739, 6.8089517465), (17.0417478802, 8.4050351858), (17.3288972096, 10.0048434687))
            ThreePointArc((17.3288972096, 10.0048434687), (15.7998481648, 10.5560688592), (14.5711889608, 11.6201351039))
        make_face()
        with BuildLine():
            ThreePointArc((22.2041931112, 12.8195968699), (24.2797982242, 11.8906966607), (25.6243943976, 10.0568337123))
            ThreePointArc((25.6243943976, 10.0568337123), (23.8392978471, 13.763624912), (21.521670802, 17.1629594899))
            ThreePointArc((21.521670802, 17.1629594899), (22.2419911729, 15.8596378138), (22.4914297362, 14.391547479))
            ThreePointArc((22.4914297362, 14.391547479), (22.4190309758, 13.5925584934), (22.2041931112, 12.8195968699))
        make_face()
        with BuildLine():
            ThreePointArc((14.5711889608, 11.6201351039), (15.7998481648, 10.5560688592), (17.3288972096, 10.0048434687))
            ThreePointArc((17.3288972096, 10.0048434687), (19.2641605846, 12.2823757795), (22.2041931112, 12.8195968699))
            ThreePointArc((22.2041931112, 12.8195968699), (22.4190309758, 13.5925584934), (22.4914297362, 14.391547479))
            ThreePointArc((22.4914297362, 14.391547479), (22.2419911729, 15.8596378138), (21.521670802, 17.1629594899))
            ThreePointArc((21.521670802, 17.1629594899), (19.6962706385, 18.5190224936), (17.4390806002, 18.7948589632))
            ThreePointArc((17.4390806002, 18.7948589632), (16.2611099805, 16.0480821291), (13.6100435462, 14.6681384642))
            ThreePointArc((13.6100435462, 14.6681384642), (13.8072032229, 13.0547664315), (14.5711889608, 11.6201351039))
        make_face()
        with BuildLine():
            ThreePointArc((22.2041931112, 12.8195968699), (19.2641605846, 12.2823757795), (17.3288972096, 10.0048434687))
            ThreePointArc((17.3288972096, 10.0048434687), (20.2689297362, 10.5420645591), (22.2041931112, 12.8195968699))
        make_face()
        with BuildLine():
            ThreePointArc((10.4987366772, 15.3988186477), (12.6765494203, 13.6620709396), (14.5711889608, 11.6201351039))
            ThreePointArc((14.5711889608, 11.6201351039), (13.8072032229, 13.0547664315), (13.6100435462, 14.6681384642))
            ThreePointArc((13.6100435462, 14.6681384642), (11.9864491518, 14.7441793798), (10.4987366772, 15.3988186477))
        make_face()
        with BuildLine():
            ThreePointArc((17.4390806002, 18.7948589632), (19.6962706385, 18.5190224936), (21.521670802, 17.1629594899))
            ThreePointArc((21.521670802, 17.1629594899), (18.7232849234, 20.1789022061), (15.5066517377, 22.7440815257))
            ThreePointArc((15.5066517377, 22.7440815257), (16.9325872409, 21.148459178), (17.4476944102, 19.0714499485))
            ThreePointArc((17.4476944102, 19.0714499485), (17.4455404358, 18.9330874076), (17.4390806002, 18.7948589632))
        make_face()
        with BuildLine():
            ThreePointArc((10.4987366772, 15.3988186477), (11.9864491518, 14.7441793798), (13.6100435462, 14.6681384642))
            ThreePointArc((13.6100435462, 14.6681384642), (14.7880141659, 17.4149152983), (17.4390806002, 18.7948589632))
            ThreePointArc((17.4390806002, 18.7948589632), (17.4455404358, 18.9330874076), (17.4476944102, 19.0714499485))
            ThreePointArc((17.4476944102, 19.0714499485), (16.9325872409, 21.148459178), (15.5066517377, 22.7440815257))
            ThreePointArc((15.5066517377, 22.7440815257), (13.3626425922, 23.5018519964), (11.1244292478, 23.1001153577))
            ThreePointArc((11.1244292478, 23.1001153577), (11.2174575975, 22.5821250907), (11.2486126245, 22.0567703964))
            ThreePointArc((11.2486126245, 22.0567703964), (10.5524066738, 19.6683466114), (8.681877787, 18.0281049871))
            ThreePointArc((8.681877787, 18.0281049871), (9.3458278667, 16.5445245275), (10.4987366772, 15.3988186477))
        make_face()
        with BuildLine():
            ThreePointArc((17.4390806002, 18.7948589632), (14.7880141659, 17.4149152983), (13.6100435462, 14.6681384642))
            ThreePointArc((13.6100435462, 14.6681384642), (16.2611099805, 16.0480821291), (17.4390806002, 18.7948589632))
        make_face()
        with BuildLine():
            ThreePointArc((5.4934258743, 17.8092492746), (8.086399676, 16.791582053), (10.4987366772, 15.3988186477))
            ThreePointArc((10.4987366772, 15.3988186477), (9.3458278667, 16.5445245275), (8.681877787, 18.0281049871))
            ThreePointArc((8.681877787, 18.0281049871), (7.108001728, 17.6222047723), (5.4934258743, 17.8092492746))
        make_face()
        with BuildLine():
            ThreePointArc((11.1244292478, 23.1001153577), (13.3626425922, 23.5018519964), (15.5066517377, 22.7440815257))
            ThreePointArc((15.5066517377, 22.7440815257), (11.9436259774, 24.8011953558), (8.1137993748, 26.3042915181))
            ThreePointArc((8.1137993748, 26.3042915181), (10.0430162679, 25.1004998579), (11.1244292478, 23.1001153577))
        make_face()
        with BuildLine():
            ThreePointArc((5.4934258743, 17.8092492746), (7.108001728, 17.6222047723), (8.681877787, 18.0281049871))
            ThreePointArc((8.681877787, 18.0281049871), (8.9978877924, 21.0000631688), (11.1244292478, 23.1001153577))
            ThreePointArc((11.1244292478, 23.1001153577), (10.0430162679, 25.1004998579), (8.1137993748, 26.3042915181))
            ThreePointArc((8.1137993748, 26.3042915181), (2.5560915028, 23.3669571466), (5.4934258743, 17.8092492746))
        make_face()
        with BuildLine():
            ThreePointArc((11.1244292478, 23.1001153577), (8.9978877924, 21.0000631688), (8.681877787, 18.0281049871))
            ThreePointArc((8.681877787, 18.0281049871), (10.5524066738, 19.6683466114), (11.2486126245, 22.0567703964))
            ThreePointArc((11.2486126245, 22.0567703964), (11.2174575975, 22.5821250907), (11.1244292478, 23.1001153577))
        make_face()
    extrude(amount=-F3_DEPTH, mode=Mode.SUBTRACT)


solid = f1.part
